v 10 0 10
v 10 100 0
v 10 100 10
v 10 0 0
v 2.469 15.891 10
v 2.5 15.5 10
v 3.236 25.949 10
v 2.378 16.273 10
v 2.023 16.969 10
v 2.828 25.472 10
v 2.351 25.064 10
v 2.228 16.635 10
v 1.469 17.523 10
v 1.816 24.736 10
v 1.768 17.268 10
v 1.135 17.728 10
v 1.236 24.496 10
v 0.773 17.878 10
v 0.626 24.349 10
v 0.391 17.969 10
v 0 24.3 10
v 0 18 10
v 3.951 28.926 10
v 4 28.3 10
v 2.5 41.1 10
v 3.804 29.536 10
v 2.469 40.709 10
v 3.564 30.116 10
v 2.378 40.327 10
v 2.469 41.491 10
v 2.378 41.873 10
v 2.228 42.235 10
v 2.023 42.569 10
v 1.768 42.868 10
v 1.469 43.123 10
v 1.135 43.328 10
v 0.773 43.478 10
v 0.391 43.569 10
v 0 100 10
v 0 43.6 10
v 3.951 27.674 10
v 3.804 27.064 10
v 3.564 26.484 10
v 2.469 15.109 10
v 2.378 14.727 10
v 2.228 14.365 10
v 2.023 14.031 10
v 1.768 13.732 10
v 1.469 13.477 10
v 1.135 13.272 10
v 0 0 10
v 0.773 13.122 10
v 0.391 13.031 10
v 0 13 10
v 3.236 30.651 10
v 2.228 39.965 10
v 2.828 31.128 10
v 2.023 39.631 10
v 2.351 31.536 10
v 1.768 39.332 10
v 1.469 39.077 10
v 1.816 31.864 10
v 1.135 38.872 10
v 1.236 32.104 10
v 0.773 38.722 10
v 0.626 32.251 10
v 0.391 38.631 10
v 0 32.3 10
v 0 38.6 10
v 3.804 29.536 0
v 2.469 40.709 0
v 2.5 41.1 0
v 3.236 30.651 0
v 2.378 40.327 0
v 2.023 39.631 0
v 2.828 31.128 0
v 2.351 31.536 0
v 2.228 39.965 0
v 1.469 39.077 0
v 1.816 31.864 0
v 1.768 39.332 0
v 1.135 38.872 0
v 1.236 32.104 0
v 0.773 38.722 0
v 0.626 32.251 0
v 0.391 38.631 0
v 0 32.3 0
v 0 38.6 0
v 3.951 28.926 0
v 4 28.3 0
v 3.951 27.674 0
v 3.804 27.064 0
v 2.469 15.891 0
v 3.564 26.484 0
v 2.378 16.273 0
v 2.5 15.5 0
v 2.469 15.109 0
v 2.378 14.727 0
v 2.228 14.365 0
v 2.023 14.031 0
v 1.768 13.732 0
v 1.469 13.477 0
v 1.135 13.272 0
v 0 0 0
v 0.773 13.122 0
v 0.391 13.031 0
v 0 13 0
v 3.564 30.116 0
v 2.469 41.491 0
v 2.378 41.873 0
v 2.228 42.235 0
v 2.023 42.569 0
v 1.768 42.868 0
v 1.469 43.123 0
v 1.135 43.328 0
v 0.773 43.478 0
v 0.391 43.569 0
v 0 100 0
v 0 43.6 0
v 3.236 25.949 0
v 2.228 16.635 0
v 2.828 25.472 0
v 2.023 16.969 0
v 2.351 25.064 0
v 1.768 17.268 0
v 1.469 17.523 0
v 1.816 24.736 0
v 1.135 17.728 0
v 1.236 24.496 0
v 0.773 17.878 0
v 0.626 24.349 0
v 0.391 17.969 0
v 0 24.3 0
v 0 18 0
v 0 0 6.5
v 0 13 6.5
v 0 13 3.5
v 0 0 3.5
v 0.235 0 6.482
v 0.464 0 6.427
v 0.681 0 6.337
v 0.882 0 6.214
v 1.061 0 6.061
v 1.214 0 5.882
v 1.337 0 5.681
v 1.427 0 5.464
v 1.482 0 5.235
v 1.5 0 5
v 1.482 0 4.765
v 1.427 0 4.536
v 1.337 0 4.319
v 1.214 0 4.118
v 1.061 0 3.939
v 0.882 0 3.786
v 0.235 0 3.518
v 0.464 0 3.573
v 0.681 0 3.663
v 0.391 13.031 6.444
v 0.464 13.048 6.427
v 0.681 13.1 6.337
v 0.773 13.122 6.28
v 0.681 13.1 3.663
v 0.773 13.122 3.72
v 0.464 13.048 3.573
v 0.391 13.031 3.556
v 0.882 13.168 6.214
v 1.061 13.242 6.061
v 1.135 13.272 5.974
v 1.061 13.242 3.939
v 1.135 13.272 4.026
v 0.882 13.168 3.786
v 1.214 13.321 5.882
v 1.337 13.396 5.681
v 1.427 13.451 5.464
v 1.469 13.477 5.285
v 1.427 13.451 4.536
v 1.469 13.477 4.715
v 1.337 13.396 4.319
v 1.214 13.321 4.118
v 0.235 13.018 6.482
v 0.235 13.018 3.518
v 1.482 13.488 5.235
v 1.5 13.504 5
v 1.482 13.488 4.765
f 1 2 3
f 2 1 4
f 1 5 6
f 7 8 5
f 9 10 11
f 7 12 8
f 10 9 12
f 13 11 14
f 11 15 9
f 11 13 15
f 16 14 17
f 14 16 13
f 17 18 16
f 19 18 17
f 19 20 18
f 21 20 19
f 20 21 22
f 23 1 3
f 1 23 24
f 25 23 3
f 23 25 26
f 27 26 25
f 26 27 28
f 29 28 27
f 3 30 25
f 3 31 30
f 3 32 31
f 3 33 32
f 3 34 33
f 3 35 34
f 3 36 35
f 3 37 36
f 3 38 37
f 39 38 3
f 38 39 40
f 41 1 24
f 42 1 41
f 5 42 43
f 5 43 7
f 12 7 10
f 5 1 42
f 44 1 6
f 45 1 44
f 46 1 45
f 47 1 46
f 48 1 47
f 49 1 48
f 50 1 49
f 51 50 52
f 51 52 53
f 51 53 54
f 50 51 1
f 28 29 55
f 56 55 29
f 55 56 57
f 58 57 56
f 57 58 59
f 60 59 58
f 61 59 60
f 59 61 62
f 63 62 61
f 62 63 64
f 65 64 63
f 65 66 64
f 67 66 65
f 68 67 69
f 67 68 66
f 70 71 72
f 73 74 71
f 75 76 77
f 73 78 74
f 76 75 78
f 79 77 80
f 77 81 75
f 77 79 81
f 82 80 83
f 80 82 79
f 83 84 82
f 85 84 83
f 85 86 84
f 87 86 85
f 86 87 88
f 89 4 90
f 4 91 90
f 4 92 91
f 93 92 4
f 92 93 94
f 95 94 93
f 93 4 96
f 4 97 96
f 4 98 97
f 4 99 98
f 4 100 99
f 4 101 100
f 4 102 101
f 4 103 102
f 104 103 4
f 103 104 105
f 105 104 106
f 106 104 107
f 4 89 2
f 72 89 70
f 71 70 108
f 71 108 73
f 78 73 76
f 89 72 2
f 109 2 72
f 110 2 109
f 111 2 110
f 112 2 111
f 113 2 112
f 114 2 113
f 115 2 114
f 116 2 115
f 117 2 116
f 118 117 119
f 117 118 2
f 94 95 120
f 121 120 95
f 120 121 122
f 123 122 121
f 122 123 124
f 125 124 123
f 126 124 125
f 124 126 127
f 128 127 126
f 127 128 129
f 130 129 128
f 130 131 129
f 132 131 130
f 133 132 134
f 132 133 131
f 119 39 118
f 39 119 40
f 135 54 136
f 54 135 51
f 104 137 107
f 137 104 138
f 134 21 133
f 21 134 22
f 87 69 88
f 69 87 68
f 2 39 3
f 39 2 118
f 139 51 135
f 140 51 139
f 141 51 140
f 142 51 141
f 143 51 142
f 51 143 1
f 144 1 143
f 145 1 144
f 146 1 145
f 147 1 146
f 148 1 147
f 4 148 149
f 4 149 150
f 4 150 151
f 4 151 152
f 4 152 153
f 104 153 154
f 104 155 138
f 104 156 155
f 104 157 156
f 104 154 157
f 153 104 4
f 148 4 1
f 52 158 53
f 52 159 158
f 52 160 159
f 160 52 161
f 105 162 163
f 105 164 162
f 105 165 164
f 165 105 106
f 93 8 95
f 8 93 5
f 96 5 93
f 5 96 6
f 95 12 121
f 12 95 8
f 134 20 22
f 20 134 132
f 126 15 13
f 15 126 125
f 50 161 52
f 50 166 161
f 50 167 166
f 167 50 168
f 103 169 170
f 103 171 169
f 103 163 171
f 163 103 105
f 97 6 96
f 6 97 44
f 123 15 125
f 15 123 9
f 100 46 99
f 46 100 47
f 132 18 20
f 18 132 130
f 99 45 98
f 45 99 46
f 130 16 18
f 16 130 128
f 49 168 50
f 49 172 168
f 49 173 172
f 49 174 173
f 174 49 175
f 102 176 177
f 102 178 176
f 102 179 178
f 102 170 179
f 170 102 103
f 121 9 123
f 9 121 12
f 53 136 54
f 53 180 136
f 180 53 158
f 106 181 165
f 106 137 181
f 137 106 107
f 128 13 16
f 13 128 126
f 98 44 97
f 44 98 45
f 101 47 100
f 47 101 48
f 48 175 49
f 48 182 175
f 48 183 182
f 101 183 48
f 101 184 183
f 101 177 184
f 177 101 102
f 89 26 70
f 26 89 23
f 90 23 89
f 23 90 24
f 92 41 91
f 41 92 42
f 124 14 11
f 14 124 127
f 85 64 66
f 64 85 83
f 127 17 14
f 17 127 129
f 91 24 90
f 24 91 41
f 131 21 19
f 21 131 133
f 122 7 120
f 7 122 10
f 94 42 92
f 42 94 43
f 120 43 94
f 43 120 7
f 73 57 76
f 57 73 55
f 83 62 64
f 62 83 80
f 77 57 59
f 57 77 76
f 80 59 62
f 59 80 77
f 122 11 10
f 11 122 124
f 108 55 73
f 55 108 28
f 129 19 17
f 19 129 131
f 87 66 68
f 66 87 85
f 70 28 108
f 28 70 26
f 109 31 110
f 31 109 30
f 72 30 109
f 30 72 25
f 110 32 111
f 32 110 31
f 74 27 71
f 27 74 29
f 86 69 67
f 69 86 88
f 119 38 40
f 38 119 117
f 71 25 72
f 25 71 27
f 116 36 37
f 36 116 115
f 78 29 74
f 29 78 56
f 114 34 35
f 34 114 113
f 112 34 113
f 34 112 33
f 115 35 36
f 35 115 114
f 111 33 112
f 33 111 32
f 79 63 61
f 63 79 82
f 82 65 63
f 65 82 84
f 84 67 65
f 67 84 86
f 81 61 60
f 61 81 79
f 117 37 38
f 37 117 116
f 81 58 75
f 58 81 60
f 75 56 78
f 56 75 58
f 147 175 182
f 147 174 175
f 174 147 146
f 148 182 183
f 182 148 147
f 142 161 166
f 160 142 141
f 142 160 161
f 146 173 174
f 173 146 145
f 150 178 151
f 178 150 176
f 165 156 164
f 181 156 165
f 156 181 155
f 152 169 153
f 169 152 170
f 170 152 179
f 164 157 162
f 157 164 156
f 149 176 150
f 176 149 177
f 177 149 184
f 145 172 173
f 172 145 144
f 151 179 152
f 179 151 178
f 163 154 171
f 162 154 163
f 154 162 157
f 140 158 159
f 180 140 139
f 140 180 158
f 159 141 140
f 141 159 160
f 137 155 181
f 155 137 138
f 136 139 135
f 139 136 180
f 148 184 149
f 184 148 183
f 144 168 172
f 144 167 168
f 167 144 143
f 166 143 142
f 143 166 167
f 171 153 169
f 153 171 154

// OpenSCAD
width = 10;
length = 100;
height = 10;
r_small_cyl = 2.5;
r_large_cyl = 4;
r_surub = 1.5;

//--------------------------------------
module piedica_senzor_atingere_v2()
{
  difference(){
    color("red") cube([width, length, height]);
    translate([0, 13 + r_small_cyl, 0]) color("yellow") cylinder(h=height, r=r_small_cyl, $fn=40);
    translate([0, 19.3  + r_small_cyl*2 + r_large_cyl, 0]) color("black") cylinder(h=height, r=r_large_cyl, $fn=40);
    translate([0, 25.6 + r_small_cyl*3 + r_large_cyl*2, 0]) color("yellow") cylinder(h=height, r=r_small_cyl, $fn=40);
   translate([0, 13 + r_small_cyl, 5]) rotate([90, 0, 0]) color("green") cylinder(h=13 + r_small_cyl, r=r_surub, $fn=40);
  }
}

piedica_senzor_atingere_v2();
